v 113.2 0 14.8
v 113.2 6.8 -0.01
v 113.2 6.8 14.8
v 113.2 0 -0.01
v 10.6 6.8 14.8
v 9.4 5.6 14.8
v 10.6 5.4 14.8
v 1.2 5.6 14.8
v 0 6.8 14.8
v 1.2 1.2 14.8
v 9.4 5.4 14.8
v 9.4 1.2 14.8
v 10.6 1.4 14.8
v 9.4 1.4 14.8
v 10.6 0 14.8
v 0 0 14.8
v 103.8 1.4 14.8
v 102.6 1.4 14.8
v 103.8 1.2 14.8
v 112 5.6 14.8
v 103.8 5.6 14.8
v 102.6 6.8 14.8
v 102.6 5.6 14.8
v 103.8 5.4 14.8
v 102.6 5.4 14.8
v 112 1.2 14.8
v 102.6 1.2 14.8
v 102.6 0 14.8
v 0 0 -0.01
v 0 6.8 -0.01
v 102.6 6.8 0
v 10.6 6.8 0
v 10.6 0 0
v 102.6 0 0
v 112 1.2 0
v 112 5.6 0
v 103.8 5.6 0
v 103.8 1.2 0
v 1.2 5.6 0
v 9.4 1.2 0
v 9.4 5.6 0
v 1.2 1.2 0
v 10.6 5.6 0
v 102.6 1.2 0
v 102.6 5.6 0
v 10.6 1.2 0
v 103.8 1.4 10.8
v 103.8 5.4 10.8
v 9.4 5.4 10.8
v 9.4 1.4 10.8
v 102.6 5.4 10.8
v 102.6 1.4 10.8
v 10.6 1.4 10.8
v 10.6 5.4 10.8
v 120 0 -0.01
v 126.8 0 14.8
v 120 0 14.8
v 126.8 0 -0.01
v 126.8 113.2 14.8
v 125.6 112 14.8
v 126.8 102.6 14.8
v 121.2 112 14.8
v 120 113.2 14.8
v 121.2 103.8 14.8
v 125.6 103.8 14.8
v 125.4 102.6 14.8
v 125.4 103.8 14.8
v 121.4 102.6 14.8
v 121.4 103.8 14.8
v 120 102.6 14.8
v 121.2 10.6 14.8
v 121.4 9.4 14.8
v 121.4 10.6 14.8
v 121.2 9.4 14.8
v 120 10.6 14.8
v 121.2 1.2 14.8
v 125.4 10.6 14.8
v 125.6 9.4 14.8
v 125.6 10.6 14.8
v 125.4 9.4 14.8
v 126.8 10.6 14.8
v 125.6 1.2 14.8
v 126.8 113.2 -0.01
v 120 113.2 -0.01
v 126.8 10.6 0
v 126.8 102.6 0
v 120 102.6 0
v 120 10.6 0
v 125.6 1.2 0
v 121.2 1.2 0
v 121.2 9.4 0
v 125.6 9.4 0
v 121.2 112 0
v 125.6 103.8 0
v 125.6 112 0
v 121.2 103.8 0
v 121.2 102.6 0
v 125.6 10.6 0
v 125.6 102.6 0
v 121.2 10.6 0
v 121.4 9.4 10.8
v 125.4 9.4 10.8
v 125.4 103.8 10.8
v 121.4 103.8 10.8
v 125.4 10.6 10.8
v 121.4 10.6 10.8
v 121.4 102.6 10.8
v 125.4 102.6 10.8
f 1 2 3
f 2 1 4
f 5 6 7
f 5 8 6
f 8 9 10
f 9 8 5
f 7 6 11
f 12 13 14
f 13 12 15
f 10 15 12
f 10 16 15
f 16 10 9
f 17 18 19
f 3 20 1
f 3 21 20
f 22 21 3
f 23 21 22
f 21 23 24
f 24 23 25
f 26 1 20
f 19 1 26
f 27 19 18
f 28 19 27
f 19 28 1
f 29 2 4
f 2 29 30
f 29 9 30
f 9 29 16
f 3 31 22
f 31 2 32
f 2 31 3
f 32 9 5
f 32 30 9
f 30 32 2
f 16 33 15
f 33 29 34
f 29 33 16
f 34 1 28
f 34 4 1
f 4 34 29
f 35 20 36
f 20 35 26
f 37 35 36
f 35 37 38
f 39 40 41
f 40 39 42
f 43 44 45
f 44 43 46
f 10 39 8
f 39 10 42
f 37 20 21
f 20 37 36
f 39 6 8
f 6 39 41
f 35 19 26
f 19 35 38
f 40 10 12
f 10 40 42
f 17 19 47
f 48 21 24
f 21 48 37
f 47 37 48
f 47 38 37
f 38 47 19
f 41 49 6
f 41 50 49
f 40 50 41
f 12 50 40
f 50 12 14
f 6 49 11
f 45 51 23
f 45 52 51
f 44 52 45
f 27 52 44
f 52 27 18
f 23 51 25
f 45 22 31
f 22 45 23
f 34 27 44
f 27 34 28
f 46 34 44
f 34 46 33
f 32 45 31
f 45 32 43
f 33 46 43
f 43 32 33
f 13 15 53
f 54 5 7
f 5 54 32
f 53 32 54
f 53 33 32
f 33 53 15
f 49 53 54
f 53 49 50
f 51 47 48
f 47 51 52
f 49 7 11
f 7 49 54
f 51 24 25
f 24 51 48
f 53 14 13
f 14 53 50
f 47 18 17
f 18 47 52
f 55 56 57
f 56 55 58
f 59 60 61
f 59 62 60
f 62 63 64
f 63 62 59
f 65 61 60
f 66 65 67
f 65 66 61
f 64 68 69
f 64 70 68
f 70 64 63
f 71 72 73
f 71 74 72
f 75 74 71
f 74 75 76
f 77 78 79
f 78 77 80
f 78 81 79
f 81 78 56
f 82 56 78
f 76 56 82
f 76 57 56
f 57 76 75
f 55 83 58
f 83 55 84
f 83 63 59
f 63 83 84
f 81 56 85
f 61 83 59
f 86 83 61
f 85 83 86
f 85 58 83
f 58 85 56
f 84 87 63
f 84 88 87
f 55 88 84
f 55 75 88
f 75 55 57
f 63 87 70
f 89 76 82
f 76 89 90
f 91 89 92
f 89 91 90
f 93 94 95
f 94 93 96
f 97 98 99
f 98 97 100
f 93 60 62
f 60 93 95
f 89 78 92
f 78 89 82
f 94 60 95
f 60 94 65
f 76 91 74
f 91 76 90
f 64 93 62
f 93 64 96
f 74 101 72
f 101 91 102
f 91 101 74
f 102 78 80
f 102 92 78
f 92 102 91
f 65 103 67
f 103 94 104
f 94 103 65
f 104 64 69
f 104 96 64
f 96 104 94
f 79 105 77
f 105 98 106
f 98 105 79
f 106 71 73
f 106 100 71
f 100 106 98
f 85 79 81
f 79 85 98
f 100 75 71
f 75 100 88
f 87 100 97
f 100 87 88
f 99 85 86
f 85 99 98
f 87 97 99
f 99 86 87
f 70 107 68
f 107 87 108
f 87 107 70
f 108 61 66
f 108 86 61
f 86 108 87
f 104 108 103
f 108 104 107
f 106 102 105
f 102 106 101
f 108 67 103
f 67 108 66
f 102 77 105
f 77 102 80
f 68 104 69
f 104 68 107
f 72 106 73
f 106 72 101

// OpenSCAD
// file: ../../Base/Boxes.scad
// Fischertechnik Box Foundation
// Pre-designed Boxes

use <Constants.scad>

include <PlacementOptions.scad>

box190Width = 190;
box190Depth = 130;
box130Width = 130;
box130Depth = 95;
boxUsageHeight = 33.9;
boxWallThickness = 2.4;
boxBaseThickness = 1.0;

// getBoxWallThickness()
// Gets the wall thickness of a Fischertechnik Box

function getBoxWallThickness() = boxWallThickness;

// Gets the usable height of a fischertechnik box
function getBoxUsageHeight() = boxUsageHeight;

// Gets the thickness of the Fischertechnik box base.
function getBoxBaseThickness() = boxBaseThickness;

// Gets the usable inner space of a Box 190 as an x/y-list
function getBox190Space() = [
    box190Width - 2*getBoxWallThickness(), 
    box190Depth - 2*getBoxWallThickness() ];

// Imports the Fischertechnik empty box 130x190 mm and places it at position 0,0
// 190x130 are the outer sizes, the inner space is slightly smaller. Use getBox190Space() to get the inner sizes.
// This module needs the STL file "Fischertechnik Box 130x190.stl" in the library path.
// The box is positioned that the usable inner space is at the 0,0,0 position. The

module Box190() {
    translate([-getBoxWallThickness(),-getBoxWallThickness(),-getBoxBaseThickness()])
        import("Fischertechnik Box 130x190.stl", convexity=3);
}

// Gets the usable inner space of a Box 130 as an x/y-list
function getBox130Space() = [
    box130Width - 2*getBoxWallThickness(), 
    box130Depth - 2*getBoxWallThickness() ];

// Imports the Fischertechnik empty box 95x130 mm and places it at position 0,0
// 190x130 are the outer sizes, the inner space is slightly smaller. Use getBox190Space() to get the inner sizes.
// This module needs the STL file "Fischertechnik Box 95x130.stl" in the library path.
// The box is positioned that the usable inner space is at the 0,0,0 position. The

module Box130() {
    translate([-getBoxWallThickness(),-getBoxWallThickness(),-getBoxBaseThickness()])
        import("Fischertechnik Box 95x130.stl", convexity=3);
}

// Creates a web at the specified box walls
// corner 0 = LowerLeft, 1 = UpperLeft, 2 = UpperRight, 3 = LowerRight
// side 0 = LeftOfCorner, 1 = RightOfCorner
// distance = Distance in mm from the corner
// box = inner width and depth of the box (default: Box 190)
// webWidth = length of the web (default is 3 mms)
// webThickness = thickness of the web (default is 1 mm)

module BoxWeb(corner, side, distance, box=getBox190Space(), webWidth=3, webThickness=1.0) {
    sink = getBoxWallThickness()/2;

    width = (corner % 2 == 0) ? 
            (side == LeftOfCorner ? webWidth : webThickness) :
            (side == LeftOfCorner ? webThickness : webWidth);

    depth = (corner % 2 == 0) ? 
            (side == RightOfCorner ? webWidth : webThickness) :
            (side == RightOfCorner ? webThickness : webWidth);
    
    xDiff = corner == LowerLeft ? 
                (side == LeftOfCorner ? -sink : distance) :
            (corner == UpperLeft ?                
                (side == LeftOfCorner ? distance : -sink) :
            (corner == UpperRight ?
                (side == LeftOfCorner ? box.x-webWidth+sink : box.x-distance-webThickness) :
                (side == LeftOfCorner ? box.x-distance-webThickness: box.x-webWidth+sink)));

    yDiff = corner == LowerLeft ? 
                (side == RightOfCorner ? -sink : distance) :
            (corner == UpperLeft ?
                (side == RightOfCorner ? box.y-distance : box.y-webWidth+sink) :
            (corner == UpperRight ?
                (side == RightOfCorner ? box.y-webWidth+sink : box.y-distance) :
                (side == RightOfCorner ? distance : -sink)));
    
    translate([xDiff, yDiff, -getExcess()])
        cube([width, depth, boxUsageHeight + 2*getExcess()]);
}
// file: ../../Base/Rotation.scad
// Fischertechnik Box Foundation
// Geometry Helpers Rotation

include <PlacementOptions.scad>

// getRotatedSpace(space, rotation=NoRotation)
// Rotates the space dependent on the specified rotation

function getRotatedSpace(space, rotation=NoRotation) = [
    (rotation == Rotate90 || rotation == Rotate270) ? space.y : space.x,
    (rotation == Rotate90 || rotation == Rotate270) ? space.x : space.y
];

// Rotates the given space around the fixed left lower corner
// space = the space the children needs as width/depth list [width,depth]
// rotation = 0 Rotate0 degrees, 1 Rotate90 degrees, 2 Rotate180 degrees, 3 Rotate270 degrees (equivalent to -90)

module RotateFix(space, rotation=Rotate0) {
    dy = (rotation == Rotate0 || rotation == Rotate270) ? 0 :
        (rotation == Rotate90) ? space.x :
        space.y;
    dx = (rotation < Rotate180) ? 0 :
        (rotation == Rotate180) ? space.x :
        space.y;
    
    translate([dx, dy, 0])
        rotate([0, 0, rotations[rotation]])
            children();
}
// file: ../../Base/Alignment.scad
// Fischertechnik Box Foundation
// Geometry Helpers Alignment

include <PlacementOptions.scad>

// getAlignedX(elementWidth, spaceWidth, align=AlignRight, offset=0)
// Gets the aligned X offset of an element with the given
// width in the given space.
// elementWidth = The width of the element to positon
// spaceWidth = The space where the element should be aligned
// align = 0 AlignLeft, 1 AlignCenter, 2 AlignRight
// offset = an optional offset from the aligned position. When
// aligned left or centered, then positive values are in X direction.
// When aligned right then positive values are in negative X direction.

function getAlignedX(elementWidth, spaceWidth, align=AlignRight, offset=0) =
    (align == AlignLeft) ?
        offset :
        ((align == AlignCenter) ?
        (spaceWidth - elementWidth)/2 + offset :
        spaceWidth - offset - elementWidth);

// getAlignedY(elementDepth, spaceDepth, align=AlignTop, offset=0)
// Gets the aligned Y offset of an element with the given
// depth in the given space.
// elementDepth = The depth of the element to positon
// spaceDepth = The space where the element should be aligned
// align = 0 AlignBottom, 1 AlignCenter, 2 AlignTop
// offset = an optional offset from the aligned position. When
// aligned bottom or centered, then positive values are in Y direction.
// When aligned top then positive values are in negative Y direction.

function getAlignedY(elementDepth, spaceDepth, align=AlignTop, offset=0) =
    (align == AlignBottom) ?
        offset :
        ((align == AlignCenter) ?
        (spaceDepth - elementDepth)/2 + offset :
        spaceDepth - offset - elementDepth);
// file: ../../Base/Constants.scad
// Fischertechnik Box Foundation
// Constants

// Constant values necessary for multiple elements

// Base constants
dividerThickness = 1.2;
excess = 0.01;
fragments = 90;
tolerance = 0.8;

// Gets the thickness of a divider 
function getDividerThickness() = dividerThickness;

// Gets the excess that is used to merge walls into each other
function getExcess() = excess;

// Gets amount of fragments of a cylinder
function getFragments() = fragments;

// Gets the inner tolerance of a frame to each side
function getTolerance() = tolerance;


// Fischertechnik specific constants
axisDiameter = 4;
axisBottomDiameter = axisDiameter + 1;
standardEdgeDistance = 2.5;
standardWebDistance = 11.5;
standardCornerLength = 15;
tubeWallFactor = 1.6;

// Gets axis diameter
function getAxisDiameter() = axisDiameter;

// Gets axis bottom diameter for thicker part at the bottom
function getAxisBottomDiameter() = axisBottomDiameter;

// gets the standard distance to the wall of the box for dockable frames with webs
function getStandardEdgeDistance() = standardEdgeDistance;

// gets the standard distance of each web to the corner of the dockable frame
function getStandardWebDistance() = standardWebDistance;

// gets the standard length of the corner walls of a dockable frame
function getStandardCornerLength() = standardCornerLength;

// gets the wall thickness of a tube.
function getTubeWallThickness() = tubeWallFactor * getDividerThickness();
// file: ../../Base/PlacementOptions.scad
// Fischertechnik Box Foundation
// Placement Options

// Alignment
NoAlign = 0;
AlignLeft = 1;
AlignBottom = 2;
AlignCenter = 3;
AlignRight = 4;
AlignTop = 5;

// Element rotation degree steps
rotations = [0, -90, -180, -270];

// Rotation
NoRotation = 0;
Rotate0 = 0;
Rotate90 = 1;
Rotate180 = 2;
Rotate270 = 3;

// Docking (seen from above)
NoDock = -1;
DockLeft = 0;
DockTop = 1;
DockRight = 2;
DockCorner = 2;
DockBottom = 3;

// Web corners
LowerLeft = 0;
UpperLeft = 1;
UpperRight = 2;
LowerRight = 3;

// Web position relative to corner
LeftOfCorner = 0;
RightOfCorner = 1;
// file: ../../Elements/FrameAxis110.scad
// Fischertechnik Box Library
// Frame for single 110 mm Axis
// 31031

use <../Base/Constants.scad>
use <../ModelBase/Complex.scad>

length = 110;

// getFrameAxis110Space()
// Gets the width (.x) and depth (.y) of the axis frame.

function getFrameAxis110Space() = getFrameAxisSpace(length);

// FrameAxis110()
// Axis holder for a single 110 mm axis.

module FrameAxis110() {
    FrameAxis(length);
}

// Test
color("lightgray")
FrameAxis110();
// file: ../../Base/Placement.scad
// Fischertechnik Box Foundation
// Geometry Helpers Placement

use <Constants.scad>
use <Alignment.scad>
use <Rotation.scad>
use <Boxes.scad>

include <PlacementOptions.scad>

// Place(x=0, y=0, elementSpace=[0,0], alignX=AlignLeft, alignY=AlignBottom, rotation=Rotate0, boxSpace=getBox190Space())
// Places the child at the specified position
// y = Y-Position. This is a relative position when an X aligment is specified.
// x = X-Position. This is a relative position when an Y aligment is specified.
// elementSpace = space of the element to be placed [x,y]
// alignX = -1=NoAlign, 0 AlignLeft, 1 AlignCenter, 3 AlignRight (elementSpace and boxSpace required!)
// alignY = -1=NoAlign, 2 AlignBottom, 1 AlignCenter, 4 AlignTop (elementSpace and boxSpace required!)
// rotation = 0 Rotate0 0 degrees, 1 Rotate90 90 degrees, 
// 2 Rotate180 180 degrees, 3 Rotate270 270 degrees (equivalent to -90)
// boxSpace = Inner space of the box where the placement occurs [x,y] - default is Box 190x130 inner space

module Place(x=0, y=0, elementSpace=[0,0], 
  alignX=AlignLeft, alignY=AlignBottom, 
  rotation=NoRotation, boxSpace=getBox190Space()) {

    module Position(x, y, space, rotation=Rotate0) {
        translate([x, y, 0])
            RotateFix(space, rotation)
                children(0);
    }

    space = getRotatedSpace(elementSpace, rotation);
    alignedX = getAlignedX(space.x, boxSpace.x, alignX, x);
    alignedY = getAlignedY(space.y, boxSpace.y, alignY, y);
    Position(alignedX, alignedY, elementSpace, rotation)
        children(0);
}

// Center(space=getBox130Space(), elementSpace=[0,0])
// space = Space where the children is centered. For cylinder use centered=true and no elementSpace.
// elementSpace = space of the element to be centered [x,y]

module Center(space=getBox190Space(), elementSpace=[0,0]) {
    translate([(space.x - elementSpace.x) / 2, (space.y - elementSpace.y) / 2])
        children(0);
}

// CenterHorizontal(width=0, y=0, offset=0, space=getBox130Space())
// space = Space where the children is centered. For cylinder use centered=true and no elementSpace.
// elementSpace = space of the element to be centered [x,y]

module CenterHorizontal(width=0, y=0, offset=0, space=getBox190Space()) {
    translate([(space.x - width) / 2 + offset, y])
        children(0);
}

// CenterVertical(depth=0, x=0, offset=0, space=getBox130Space())
// space = Space where the children is centered. For cylinder use centered=true and no elementSpace.
// elementSpace = space of the element to be centered [x,y]

module CenterVerticalal(depth=0, x=0, offset=0, space=getBox190Space()) {
    translate([x, (space.y - depth) / 2 + offset])
        children(0);
}
// main file
// Fischertechnik Box Foundation
// Elements
// Test FrameAxis110

use <../../Base/Placement.scad>
use <../../Elements/FrameAxis110.scad>

include <../../Base/PlacementOptions.scad>

FrameAxis110();

Place(120, 0, elementSpace=getFrameAxis110Space(), rotation=Rotate90)
    FrameAxis110();
